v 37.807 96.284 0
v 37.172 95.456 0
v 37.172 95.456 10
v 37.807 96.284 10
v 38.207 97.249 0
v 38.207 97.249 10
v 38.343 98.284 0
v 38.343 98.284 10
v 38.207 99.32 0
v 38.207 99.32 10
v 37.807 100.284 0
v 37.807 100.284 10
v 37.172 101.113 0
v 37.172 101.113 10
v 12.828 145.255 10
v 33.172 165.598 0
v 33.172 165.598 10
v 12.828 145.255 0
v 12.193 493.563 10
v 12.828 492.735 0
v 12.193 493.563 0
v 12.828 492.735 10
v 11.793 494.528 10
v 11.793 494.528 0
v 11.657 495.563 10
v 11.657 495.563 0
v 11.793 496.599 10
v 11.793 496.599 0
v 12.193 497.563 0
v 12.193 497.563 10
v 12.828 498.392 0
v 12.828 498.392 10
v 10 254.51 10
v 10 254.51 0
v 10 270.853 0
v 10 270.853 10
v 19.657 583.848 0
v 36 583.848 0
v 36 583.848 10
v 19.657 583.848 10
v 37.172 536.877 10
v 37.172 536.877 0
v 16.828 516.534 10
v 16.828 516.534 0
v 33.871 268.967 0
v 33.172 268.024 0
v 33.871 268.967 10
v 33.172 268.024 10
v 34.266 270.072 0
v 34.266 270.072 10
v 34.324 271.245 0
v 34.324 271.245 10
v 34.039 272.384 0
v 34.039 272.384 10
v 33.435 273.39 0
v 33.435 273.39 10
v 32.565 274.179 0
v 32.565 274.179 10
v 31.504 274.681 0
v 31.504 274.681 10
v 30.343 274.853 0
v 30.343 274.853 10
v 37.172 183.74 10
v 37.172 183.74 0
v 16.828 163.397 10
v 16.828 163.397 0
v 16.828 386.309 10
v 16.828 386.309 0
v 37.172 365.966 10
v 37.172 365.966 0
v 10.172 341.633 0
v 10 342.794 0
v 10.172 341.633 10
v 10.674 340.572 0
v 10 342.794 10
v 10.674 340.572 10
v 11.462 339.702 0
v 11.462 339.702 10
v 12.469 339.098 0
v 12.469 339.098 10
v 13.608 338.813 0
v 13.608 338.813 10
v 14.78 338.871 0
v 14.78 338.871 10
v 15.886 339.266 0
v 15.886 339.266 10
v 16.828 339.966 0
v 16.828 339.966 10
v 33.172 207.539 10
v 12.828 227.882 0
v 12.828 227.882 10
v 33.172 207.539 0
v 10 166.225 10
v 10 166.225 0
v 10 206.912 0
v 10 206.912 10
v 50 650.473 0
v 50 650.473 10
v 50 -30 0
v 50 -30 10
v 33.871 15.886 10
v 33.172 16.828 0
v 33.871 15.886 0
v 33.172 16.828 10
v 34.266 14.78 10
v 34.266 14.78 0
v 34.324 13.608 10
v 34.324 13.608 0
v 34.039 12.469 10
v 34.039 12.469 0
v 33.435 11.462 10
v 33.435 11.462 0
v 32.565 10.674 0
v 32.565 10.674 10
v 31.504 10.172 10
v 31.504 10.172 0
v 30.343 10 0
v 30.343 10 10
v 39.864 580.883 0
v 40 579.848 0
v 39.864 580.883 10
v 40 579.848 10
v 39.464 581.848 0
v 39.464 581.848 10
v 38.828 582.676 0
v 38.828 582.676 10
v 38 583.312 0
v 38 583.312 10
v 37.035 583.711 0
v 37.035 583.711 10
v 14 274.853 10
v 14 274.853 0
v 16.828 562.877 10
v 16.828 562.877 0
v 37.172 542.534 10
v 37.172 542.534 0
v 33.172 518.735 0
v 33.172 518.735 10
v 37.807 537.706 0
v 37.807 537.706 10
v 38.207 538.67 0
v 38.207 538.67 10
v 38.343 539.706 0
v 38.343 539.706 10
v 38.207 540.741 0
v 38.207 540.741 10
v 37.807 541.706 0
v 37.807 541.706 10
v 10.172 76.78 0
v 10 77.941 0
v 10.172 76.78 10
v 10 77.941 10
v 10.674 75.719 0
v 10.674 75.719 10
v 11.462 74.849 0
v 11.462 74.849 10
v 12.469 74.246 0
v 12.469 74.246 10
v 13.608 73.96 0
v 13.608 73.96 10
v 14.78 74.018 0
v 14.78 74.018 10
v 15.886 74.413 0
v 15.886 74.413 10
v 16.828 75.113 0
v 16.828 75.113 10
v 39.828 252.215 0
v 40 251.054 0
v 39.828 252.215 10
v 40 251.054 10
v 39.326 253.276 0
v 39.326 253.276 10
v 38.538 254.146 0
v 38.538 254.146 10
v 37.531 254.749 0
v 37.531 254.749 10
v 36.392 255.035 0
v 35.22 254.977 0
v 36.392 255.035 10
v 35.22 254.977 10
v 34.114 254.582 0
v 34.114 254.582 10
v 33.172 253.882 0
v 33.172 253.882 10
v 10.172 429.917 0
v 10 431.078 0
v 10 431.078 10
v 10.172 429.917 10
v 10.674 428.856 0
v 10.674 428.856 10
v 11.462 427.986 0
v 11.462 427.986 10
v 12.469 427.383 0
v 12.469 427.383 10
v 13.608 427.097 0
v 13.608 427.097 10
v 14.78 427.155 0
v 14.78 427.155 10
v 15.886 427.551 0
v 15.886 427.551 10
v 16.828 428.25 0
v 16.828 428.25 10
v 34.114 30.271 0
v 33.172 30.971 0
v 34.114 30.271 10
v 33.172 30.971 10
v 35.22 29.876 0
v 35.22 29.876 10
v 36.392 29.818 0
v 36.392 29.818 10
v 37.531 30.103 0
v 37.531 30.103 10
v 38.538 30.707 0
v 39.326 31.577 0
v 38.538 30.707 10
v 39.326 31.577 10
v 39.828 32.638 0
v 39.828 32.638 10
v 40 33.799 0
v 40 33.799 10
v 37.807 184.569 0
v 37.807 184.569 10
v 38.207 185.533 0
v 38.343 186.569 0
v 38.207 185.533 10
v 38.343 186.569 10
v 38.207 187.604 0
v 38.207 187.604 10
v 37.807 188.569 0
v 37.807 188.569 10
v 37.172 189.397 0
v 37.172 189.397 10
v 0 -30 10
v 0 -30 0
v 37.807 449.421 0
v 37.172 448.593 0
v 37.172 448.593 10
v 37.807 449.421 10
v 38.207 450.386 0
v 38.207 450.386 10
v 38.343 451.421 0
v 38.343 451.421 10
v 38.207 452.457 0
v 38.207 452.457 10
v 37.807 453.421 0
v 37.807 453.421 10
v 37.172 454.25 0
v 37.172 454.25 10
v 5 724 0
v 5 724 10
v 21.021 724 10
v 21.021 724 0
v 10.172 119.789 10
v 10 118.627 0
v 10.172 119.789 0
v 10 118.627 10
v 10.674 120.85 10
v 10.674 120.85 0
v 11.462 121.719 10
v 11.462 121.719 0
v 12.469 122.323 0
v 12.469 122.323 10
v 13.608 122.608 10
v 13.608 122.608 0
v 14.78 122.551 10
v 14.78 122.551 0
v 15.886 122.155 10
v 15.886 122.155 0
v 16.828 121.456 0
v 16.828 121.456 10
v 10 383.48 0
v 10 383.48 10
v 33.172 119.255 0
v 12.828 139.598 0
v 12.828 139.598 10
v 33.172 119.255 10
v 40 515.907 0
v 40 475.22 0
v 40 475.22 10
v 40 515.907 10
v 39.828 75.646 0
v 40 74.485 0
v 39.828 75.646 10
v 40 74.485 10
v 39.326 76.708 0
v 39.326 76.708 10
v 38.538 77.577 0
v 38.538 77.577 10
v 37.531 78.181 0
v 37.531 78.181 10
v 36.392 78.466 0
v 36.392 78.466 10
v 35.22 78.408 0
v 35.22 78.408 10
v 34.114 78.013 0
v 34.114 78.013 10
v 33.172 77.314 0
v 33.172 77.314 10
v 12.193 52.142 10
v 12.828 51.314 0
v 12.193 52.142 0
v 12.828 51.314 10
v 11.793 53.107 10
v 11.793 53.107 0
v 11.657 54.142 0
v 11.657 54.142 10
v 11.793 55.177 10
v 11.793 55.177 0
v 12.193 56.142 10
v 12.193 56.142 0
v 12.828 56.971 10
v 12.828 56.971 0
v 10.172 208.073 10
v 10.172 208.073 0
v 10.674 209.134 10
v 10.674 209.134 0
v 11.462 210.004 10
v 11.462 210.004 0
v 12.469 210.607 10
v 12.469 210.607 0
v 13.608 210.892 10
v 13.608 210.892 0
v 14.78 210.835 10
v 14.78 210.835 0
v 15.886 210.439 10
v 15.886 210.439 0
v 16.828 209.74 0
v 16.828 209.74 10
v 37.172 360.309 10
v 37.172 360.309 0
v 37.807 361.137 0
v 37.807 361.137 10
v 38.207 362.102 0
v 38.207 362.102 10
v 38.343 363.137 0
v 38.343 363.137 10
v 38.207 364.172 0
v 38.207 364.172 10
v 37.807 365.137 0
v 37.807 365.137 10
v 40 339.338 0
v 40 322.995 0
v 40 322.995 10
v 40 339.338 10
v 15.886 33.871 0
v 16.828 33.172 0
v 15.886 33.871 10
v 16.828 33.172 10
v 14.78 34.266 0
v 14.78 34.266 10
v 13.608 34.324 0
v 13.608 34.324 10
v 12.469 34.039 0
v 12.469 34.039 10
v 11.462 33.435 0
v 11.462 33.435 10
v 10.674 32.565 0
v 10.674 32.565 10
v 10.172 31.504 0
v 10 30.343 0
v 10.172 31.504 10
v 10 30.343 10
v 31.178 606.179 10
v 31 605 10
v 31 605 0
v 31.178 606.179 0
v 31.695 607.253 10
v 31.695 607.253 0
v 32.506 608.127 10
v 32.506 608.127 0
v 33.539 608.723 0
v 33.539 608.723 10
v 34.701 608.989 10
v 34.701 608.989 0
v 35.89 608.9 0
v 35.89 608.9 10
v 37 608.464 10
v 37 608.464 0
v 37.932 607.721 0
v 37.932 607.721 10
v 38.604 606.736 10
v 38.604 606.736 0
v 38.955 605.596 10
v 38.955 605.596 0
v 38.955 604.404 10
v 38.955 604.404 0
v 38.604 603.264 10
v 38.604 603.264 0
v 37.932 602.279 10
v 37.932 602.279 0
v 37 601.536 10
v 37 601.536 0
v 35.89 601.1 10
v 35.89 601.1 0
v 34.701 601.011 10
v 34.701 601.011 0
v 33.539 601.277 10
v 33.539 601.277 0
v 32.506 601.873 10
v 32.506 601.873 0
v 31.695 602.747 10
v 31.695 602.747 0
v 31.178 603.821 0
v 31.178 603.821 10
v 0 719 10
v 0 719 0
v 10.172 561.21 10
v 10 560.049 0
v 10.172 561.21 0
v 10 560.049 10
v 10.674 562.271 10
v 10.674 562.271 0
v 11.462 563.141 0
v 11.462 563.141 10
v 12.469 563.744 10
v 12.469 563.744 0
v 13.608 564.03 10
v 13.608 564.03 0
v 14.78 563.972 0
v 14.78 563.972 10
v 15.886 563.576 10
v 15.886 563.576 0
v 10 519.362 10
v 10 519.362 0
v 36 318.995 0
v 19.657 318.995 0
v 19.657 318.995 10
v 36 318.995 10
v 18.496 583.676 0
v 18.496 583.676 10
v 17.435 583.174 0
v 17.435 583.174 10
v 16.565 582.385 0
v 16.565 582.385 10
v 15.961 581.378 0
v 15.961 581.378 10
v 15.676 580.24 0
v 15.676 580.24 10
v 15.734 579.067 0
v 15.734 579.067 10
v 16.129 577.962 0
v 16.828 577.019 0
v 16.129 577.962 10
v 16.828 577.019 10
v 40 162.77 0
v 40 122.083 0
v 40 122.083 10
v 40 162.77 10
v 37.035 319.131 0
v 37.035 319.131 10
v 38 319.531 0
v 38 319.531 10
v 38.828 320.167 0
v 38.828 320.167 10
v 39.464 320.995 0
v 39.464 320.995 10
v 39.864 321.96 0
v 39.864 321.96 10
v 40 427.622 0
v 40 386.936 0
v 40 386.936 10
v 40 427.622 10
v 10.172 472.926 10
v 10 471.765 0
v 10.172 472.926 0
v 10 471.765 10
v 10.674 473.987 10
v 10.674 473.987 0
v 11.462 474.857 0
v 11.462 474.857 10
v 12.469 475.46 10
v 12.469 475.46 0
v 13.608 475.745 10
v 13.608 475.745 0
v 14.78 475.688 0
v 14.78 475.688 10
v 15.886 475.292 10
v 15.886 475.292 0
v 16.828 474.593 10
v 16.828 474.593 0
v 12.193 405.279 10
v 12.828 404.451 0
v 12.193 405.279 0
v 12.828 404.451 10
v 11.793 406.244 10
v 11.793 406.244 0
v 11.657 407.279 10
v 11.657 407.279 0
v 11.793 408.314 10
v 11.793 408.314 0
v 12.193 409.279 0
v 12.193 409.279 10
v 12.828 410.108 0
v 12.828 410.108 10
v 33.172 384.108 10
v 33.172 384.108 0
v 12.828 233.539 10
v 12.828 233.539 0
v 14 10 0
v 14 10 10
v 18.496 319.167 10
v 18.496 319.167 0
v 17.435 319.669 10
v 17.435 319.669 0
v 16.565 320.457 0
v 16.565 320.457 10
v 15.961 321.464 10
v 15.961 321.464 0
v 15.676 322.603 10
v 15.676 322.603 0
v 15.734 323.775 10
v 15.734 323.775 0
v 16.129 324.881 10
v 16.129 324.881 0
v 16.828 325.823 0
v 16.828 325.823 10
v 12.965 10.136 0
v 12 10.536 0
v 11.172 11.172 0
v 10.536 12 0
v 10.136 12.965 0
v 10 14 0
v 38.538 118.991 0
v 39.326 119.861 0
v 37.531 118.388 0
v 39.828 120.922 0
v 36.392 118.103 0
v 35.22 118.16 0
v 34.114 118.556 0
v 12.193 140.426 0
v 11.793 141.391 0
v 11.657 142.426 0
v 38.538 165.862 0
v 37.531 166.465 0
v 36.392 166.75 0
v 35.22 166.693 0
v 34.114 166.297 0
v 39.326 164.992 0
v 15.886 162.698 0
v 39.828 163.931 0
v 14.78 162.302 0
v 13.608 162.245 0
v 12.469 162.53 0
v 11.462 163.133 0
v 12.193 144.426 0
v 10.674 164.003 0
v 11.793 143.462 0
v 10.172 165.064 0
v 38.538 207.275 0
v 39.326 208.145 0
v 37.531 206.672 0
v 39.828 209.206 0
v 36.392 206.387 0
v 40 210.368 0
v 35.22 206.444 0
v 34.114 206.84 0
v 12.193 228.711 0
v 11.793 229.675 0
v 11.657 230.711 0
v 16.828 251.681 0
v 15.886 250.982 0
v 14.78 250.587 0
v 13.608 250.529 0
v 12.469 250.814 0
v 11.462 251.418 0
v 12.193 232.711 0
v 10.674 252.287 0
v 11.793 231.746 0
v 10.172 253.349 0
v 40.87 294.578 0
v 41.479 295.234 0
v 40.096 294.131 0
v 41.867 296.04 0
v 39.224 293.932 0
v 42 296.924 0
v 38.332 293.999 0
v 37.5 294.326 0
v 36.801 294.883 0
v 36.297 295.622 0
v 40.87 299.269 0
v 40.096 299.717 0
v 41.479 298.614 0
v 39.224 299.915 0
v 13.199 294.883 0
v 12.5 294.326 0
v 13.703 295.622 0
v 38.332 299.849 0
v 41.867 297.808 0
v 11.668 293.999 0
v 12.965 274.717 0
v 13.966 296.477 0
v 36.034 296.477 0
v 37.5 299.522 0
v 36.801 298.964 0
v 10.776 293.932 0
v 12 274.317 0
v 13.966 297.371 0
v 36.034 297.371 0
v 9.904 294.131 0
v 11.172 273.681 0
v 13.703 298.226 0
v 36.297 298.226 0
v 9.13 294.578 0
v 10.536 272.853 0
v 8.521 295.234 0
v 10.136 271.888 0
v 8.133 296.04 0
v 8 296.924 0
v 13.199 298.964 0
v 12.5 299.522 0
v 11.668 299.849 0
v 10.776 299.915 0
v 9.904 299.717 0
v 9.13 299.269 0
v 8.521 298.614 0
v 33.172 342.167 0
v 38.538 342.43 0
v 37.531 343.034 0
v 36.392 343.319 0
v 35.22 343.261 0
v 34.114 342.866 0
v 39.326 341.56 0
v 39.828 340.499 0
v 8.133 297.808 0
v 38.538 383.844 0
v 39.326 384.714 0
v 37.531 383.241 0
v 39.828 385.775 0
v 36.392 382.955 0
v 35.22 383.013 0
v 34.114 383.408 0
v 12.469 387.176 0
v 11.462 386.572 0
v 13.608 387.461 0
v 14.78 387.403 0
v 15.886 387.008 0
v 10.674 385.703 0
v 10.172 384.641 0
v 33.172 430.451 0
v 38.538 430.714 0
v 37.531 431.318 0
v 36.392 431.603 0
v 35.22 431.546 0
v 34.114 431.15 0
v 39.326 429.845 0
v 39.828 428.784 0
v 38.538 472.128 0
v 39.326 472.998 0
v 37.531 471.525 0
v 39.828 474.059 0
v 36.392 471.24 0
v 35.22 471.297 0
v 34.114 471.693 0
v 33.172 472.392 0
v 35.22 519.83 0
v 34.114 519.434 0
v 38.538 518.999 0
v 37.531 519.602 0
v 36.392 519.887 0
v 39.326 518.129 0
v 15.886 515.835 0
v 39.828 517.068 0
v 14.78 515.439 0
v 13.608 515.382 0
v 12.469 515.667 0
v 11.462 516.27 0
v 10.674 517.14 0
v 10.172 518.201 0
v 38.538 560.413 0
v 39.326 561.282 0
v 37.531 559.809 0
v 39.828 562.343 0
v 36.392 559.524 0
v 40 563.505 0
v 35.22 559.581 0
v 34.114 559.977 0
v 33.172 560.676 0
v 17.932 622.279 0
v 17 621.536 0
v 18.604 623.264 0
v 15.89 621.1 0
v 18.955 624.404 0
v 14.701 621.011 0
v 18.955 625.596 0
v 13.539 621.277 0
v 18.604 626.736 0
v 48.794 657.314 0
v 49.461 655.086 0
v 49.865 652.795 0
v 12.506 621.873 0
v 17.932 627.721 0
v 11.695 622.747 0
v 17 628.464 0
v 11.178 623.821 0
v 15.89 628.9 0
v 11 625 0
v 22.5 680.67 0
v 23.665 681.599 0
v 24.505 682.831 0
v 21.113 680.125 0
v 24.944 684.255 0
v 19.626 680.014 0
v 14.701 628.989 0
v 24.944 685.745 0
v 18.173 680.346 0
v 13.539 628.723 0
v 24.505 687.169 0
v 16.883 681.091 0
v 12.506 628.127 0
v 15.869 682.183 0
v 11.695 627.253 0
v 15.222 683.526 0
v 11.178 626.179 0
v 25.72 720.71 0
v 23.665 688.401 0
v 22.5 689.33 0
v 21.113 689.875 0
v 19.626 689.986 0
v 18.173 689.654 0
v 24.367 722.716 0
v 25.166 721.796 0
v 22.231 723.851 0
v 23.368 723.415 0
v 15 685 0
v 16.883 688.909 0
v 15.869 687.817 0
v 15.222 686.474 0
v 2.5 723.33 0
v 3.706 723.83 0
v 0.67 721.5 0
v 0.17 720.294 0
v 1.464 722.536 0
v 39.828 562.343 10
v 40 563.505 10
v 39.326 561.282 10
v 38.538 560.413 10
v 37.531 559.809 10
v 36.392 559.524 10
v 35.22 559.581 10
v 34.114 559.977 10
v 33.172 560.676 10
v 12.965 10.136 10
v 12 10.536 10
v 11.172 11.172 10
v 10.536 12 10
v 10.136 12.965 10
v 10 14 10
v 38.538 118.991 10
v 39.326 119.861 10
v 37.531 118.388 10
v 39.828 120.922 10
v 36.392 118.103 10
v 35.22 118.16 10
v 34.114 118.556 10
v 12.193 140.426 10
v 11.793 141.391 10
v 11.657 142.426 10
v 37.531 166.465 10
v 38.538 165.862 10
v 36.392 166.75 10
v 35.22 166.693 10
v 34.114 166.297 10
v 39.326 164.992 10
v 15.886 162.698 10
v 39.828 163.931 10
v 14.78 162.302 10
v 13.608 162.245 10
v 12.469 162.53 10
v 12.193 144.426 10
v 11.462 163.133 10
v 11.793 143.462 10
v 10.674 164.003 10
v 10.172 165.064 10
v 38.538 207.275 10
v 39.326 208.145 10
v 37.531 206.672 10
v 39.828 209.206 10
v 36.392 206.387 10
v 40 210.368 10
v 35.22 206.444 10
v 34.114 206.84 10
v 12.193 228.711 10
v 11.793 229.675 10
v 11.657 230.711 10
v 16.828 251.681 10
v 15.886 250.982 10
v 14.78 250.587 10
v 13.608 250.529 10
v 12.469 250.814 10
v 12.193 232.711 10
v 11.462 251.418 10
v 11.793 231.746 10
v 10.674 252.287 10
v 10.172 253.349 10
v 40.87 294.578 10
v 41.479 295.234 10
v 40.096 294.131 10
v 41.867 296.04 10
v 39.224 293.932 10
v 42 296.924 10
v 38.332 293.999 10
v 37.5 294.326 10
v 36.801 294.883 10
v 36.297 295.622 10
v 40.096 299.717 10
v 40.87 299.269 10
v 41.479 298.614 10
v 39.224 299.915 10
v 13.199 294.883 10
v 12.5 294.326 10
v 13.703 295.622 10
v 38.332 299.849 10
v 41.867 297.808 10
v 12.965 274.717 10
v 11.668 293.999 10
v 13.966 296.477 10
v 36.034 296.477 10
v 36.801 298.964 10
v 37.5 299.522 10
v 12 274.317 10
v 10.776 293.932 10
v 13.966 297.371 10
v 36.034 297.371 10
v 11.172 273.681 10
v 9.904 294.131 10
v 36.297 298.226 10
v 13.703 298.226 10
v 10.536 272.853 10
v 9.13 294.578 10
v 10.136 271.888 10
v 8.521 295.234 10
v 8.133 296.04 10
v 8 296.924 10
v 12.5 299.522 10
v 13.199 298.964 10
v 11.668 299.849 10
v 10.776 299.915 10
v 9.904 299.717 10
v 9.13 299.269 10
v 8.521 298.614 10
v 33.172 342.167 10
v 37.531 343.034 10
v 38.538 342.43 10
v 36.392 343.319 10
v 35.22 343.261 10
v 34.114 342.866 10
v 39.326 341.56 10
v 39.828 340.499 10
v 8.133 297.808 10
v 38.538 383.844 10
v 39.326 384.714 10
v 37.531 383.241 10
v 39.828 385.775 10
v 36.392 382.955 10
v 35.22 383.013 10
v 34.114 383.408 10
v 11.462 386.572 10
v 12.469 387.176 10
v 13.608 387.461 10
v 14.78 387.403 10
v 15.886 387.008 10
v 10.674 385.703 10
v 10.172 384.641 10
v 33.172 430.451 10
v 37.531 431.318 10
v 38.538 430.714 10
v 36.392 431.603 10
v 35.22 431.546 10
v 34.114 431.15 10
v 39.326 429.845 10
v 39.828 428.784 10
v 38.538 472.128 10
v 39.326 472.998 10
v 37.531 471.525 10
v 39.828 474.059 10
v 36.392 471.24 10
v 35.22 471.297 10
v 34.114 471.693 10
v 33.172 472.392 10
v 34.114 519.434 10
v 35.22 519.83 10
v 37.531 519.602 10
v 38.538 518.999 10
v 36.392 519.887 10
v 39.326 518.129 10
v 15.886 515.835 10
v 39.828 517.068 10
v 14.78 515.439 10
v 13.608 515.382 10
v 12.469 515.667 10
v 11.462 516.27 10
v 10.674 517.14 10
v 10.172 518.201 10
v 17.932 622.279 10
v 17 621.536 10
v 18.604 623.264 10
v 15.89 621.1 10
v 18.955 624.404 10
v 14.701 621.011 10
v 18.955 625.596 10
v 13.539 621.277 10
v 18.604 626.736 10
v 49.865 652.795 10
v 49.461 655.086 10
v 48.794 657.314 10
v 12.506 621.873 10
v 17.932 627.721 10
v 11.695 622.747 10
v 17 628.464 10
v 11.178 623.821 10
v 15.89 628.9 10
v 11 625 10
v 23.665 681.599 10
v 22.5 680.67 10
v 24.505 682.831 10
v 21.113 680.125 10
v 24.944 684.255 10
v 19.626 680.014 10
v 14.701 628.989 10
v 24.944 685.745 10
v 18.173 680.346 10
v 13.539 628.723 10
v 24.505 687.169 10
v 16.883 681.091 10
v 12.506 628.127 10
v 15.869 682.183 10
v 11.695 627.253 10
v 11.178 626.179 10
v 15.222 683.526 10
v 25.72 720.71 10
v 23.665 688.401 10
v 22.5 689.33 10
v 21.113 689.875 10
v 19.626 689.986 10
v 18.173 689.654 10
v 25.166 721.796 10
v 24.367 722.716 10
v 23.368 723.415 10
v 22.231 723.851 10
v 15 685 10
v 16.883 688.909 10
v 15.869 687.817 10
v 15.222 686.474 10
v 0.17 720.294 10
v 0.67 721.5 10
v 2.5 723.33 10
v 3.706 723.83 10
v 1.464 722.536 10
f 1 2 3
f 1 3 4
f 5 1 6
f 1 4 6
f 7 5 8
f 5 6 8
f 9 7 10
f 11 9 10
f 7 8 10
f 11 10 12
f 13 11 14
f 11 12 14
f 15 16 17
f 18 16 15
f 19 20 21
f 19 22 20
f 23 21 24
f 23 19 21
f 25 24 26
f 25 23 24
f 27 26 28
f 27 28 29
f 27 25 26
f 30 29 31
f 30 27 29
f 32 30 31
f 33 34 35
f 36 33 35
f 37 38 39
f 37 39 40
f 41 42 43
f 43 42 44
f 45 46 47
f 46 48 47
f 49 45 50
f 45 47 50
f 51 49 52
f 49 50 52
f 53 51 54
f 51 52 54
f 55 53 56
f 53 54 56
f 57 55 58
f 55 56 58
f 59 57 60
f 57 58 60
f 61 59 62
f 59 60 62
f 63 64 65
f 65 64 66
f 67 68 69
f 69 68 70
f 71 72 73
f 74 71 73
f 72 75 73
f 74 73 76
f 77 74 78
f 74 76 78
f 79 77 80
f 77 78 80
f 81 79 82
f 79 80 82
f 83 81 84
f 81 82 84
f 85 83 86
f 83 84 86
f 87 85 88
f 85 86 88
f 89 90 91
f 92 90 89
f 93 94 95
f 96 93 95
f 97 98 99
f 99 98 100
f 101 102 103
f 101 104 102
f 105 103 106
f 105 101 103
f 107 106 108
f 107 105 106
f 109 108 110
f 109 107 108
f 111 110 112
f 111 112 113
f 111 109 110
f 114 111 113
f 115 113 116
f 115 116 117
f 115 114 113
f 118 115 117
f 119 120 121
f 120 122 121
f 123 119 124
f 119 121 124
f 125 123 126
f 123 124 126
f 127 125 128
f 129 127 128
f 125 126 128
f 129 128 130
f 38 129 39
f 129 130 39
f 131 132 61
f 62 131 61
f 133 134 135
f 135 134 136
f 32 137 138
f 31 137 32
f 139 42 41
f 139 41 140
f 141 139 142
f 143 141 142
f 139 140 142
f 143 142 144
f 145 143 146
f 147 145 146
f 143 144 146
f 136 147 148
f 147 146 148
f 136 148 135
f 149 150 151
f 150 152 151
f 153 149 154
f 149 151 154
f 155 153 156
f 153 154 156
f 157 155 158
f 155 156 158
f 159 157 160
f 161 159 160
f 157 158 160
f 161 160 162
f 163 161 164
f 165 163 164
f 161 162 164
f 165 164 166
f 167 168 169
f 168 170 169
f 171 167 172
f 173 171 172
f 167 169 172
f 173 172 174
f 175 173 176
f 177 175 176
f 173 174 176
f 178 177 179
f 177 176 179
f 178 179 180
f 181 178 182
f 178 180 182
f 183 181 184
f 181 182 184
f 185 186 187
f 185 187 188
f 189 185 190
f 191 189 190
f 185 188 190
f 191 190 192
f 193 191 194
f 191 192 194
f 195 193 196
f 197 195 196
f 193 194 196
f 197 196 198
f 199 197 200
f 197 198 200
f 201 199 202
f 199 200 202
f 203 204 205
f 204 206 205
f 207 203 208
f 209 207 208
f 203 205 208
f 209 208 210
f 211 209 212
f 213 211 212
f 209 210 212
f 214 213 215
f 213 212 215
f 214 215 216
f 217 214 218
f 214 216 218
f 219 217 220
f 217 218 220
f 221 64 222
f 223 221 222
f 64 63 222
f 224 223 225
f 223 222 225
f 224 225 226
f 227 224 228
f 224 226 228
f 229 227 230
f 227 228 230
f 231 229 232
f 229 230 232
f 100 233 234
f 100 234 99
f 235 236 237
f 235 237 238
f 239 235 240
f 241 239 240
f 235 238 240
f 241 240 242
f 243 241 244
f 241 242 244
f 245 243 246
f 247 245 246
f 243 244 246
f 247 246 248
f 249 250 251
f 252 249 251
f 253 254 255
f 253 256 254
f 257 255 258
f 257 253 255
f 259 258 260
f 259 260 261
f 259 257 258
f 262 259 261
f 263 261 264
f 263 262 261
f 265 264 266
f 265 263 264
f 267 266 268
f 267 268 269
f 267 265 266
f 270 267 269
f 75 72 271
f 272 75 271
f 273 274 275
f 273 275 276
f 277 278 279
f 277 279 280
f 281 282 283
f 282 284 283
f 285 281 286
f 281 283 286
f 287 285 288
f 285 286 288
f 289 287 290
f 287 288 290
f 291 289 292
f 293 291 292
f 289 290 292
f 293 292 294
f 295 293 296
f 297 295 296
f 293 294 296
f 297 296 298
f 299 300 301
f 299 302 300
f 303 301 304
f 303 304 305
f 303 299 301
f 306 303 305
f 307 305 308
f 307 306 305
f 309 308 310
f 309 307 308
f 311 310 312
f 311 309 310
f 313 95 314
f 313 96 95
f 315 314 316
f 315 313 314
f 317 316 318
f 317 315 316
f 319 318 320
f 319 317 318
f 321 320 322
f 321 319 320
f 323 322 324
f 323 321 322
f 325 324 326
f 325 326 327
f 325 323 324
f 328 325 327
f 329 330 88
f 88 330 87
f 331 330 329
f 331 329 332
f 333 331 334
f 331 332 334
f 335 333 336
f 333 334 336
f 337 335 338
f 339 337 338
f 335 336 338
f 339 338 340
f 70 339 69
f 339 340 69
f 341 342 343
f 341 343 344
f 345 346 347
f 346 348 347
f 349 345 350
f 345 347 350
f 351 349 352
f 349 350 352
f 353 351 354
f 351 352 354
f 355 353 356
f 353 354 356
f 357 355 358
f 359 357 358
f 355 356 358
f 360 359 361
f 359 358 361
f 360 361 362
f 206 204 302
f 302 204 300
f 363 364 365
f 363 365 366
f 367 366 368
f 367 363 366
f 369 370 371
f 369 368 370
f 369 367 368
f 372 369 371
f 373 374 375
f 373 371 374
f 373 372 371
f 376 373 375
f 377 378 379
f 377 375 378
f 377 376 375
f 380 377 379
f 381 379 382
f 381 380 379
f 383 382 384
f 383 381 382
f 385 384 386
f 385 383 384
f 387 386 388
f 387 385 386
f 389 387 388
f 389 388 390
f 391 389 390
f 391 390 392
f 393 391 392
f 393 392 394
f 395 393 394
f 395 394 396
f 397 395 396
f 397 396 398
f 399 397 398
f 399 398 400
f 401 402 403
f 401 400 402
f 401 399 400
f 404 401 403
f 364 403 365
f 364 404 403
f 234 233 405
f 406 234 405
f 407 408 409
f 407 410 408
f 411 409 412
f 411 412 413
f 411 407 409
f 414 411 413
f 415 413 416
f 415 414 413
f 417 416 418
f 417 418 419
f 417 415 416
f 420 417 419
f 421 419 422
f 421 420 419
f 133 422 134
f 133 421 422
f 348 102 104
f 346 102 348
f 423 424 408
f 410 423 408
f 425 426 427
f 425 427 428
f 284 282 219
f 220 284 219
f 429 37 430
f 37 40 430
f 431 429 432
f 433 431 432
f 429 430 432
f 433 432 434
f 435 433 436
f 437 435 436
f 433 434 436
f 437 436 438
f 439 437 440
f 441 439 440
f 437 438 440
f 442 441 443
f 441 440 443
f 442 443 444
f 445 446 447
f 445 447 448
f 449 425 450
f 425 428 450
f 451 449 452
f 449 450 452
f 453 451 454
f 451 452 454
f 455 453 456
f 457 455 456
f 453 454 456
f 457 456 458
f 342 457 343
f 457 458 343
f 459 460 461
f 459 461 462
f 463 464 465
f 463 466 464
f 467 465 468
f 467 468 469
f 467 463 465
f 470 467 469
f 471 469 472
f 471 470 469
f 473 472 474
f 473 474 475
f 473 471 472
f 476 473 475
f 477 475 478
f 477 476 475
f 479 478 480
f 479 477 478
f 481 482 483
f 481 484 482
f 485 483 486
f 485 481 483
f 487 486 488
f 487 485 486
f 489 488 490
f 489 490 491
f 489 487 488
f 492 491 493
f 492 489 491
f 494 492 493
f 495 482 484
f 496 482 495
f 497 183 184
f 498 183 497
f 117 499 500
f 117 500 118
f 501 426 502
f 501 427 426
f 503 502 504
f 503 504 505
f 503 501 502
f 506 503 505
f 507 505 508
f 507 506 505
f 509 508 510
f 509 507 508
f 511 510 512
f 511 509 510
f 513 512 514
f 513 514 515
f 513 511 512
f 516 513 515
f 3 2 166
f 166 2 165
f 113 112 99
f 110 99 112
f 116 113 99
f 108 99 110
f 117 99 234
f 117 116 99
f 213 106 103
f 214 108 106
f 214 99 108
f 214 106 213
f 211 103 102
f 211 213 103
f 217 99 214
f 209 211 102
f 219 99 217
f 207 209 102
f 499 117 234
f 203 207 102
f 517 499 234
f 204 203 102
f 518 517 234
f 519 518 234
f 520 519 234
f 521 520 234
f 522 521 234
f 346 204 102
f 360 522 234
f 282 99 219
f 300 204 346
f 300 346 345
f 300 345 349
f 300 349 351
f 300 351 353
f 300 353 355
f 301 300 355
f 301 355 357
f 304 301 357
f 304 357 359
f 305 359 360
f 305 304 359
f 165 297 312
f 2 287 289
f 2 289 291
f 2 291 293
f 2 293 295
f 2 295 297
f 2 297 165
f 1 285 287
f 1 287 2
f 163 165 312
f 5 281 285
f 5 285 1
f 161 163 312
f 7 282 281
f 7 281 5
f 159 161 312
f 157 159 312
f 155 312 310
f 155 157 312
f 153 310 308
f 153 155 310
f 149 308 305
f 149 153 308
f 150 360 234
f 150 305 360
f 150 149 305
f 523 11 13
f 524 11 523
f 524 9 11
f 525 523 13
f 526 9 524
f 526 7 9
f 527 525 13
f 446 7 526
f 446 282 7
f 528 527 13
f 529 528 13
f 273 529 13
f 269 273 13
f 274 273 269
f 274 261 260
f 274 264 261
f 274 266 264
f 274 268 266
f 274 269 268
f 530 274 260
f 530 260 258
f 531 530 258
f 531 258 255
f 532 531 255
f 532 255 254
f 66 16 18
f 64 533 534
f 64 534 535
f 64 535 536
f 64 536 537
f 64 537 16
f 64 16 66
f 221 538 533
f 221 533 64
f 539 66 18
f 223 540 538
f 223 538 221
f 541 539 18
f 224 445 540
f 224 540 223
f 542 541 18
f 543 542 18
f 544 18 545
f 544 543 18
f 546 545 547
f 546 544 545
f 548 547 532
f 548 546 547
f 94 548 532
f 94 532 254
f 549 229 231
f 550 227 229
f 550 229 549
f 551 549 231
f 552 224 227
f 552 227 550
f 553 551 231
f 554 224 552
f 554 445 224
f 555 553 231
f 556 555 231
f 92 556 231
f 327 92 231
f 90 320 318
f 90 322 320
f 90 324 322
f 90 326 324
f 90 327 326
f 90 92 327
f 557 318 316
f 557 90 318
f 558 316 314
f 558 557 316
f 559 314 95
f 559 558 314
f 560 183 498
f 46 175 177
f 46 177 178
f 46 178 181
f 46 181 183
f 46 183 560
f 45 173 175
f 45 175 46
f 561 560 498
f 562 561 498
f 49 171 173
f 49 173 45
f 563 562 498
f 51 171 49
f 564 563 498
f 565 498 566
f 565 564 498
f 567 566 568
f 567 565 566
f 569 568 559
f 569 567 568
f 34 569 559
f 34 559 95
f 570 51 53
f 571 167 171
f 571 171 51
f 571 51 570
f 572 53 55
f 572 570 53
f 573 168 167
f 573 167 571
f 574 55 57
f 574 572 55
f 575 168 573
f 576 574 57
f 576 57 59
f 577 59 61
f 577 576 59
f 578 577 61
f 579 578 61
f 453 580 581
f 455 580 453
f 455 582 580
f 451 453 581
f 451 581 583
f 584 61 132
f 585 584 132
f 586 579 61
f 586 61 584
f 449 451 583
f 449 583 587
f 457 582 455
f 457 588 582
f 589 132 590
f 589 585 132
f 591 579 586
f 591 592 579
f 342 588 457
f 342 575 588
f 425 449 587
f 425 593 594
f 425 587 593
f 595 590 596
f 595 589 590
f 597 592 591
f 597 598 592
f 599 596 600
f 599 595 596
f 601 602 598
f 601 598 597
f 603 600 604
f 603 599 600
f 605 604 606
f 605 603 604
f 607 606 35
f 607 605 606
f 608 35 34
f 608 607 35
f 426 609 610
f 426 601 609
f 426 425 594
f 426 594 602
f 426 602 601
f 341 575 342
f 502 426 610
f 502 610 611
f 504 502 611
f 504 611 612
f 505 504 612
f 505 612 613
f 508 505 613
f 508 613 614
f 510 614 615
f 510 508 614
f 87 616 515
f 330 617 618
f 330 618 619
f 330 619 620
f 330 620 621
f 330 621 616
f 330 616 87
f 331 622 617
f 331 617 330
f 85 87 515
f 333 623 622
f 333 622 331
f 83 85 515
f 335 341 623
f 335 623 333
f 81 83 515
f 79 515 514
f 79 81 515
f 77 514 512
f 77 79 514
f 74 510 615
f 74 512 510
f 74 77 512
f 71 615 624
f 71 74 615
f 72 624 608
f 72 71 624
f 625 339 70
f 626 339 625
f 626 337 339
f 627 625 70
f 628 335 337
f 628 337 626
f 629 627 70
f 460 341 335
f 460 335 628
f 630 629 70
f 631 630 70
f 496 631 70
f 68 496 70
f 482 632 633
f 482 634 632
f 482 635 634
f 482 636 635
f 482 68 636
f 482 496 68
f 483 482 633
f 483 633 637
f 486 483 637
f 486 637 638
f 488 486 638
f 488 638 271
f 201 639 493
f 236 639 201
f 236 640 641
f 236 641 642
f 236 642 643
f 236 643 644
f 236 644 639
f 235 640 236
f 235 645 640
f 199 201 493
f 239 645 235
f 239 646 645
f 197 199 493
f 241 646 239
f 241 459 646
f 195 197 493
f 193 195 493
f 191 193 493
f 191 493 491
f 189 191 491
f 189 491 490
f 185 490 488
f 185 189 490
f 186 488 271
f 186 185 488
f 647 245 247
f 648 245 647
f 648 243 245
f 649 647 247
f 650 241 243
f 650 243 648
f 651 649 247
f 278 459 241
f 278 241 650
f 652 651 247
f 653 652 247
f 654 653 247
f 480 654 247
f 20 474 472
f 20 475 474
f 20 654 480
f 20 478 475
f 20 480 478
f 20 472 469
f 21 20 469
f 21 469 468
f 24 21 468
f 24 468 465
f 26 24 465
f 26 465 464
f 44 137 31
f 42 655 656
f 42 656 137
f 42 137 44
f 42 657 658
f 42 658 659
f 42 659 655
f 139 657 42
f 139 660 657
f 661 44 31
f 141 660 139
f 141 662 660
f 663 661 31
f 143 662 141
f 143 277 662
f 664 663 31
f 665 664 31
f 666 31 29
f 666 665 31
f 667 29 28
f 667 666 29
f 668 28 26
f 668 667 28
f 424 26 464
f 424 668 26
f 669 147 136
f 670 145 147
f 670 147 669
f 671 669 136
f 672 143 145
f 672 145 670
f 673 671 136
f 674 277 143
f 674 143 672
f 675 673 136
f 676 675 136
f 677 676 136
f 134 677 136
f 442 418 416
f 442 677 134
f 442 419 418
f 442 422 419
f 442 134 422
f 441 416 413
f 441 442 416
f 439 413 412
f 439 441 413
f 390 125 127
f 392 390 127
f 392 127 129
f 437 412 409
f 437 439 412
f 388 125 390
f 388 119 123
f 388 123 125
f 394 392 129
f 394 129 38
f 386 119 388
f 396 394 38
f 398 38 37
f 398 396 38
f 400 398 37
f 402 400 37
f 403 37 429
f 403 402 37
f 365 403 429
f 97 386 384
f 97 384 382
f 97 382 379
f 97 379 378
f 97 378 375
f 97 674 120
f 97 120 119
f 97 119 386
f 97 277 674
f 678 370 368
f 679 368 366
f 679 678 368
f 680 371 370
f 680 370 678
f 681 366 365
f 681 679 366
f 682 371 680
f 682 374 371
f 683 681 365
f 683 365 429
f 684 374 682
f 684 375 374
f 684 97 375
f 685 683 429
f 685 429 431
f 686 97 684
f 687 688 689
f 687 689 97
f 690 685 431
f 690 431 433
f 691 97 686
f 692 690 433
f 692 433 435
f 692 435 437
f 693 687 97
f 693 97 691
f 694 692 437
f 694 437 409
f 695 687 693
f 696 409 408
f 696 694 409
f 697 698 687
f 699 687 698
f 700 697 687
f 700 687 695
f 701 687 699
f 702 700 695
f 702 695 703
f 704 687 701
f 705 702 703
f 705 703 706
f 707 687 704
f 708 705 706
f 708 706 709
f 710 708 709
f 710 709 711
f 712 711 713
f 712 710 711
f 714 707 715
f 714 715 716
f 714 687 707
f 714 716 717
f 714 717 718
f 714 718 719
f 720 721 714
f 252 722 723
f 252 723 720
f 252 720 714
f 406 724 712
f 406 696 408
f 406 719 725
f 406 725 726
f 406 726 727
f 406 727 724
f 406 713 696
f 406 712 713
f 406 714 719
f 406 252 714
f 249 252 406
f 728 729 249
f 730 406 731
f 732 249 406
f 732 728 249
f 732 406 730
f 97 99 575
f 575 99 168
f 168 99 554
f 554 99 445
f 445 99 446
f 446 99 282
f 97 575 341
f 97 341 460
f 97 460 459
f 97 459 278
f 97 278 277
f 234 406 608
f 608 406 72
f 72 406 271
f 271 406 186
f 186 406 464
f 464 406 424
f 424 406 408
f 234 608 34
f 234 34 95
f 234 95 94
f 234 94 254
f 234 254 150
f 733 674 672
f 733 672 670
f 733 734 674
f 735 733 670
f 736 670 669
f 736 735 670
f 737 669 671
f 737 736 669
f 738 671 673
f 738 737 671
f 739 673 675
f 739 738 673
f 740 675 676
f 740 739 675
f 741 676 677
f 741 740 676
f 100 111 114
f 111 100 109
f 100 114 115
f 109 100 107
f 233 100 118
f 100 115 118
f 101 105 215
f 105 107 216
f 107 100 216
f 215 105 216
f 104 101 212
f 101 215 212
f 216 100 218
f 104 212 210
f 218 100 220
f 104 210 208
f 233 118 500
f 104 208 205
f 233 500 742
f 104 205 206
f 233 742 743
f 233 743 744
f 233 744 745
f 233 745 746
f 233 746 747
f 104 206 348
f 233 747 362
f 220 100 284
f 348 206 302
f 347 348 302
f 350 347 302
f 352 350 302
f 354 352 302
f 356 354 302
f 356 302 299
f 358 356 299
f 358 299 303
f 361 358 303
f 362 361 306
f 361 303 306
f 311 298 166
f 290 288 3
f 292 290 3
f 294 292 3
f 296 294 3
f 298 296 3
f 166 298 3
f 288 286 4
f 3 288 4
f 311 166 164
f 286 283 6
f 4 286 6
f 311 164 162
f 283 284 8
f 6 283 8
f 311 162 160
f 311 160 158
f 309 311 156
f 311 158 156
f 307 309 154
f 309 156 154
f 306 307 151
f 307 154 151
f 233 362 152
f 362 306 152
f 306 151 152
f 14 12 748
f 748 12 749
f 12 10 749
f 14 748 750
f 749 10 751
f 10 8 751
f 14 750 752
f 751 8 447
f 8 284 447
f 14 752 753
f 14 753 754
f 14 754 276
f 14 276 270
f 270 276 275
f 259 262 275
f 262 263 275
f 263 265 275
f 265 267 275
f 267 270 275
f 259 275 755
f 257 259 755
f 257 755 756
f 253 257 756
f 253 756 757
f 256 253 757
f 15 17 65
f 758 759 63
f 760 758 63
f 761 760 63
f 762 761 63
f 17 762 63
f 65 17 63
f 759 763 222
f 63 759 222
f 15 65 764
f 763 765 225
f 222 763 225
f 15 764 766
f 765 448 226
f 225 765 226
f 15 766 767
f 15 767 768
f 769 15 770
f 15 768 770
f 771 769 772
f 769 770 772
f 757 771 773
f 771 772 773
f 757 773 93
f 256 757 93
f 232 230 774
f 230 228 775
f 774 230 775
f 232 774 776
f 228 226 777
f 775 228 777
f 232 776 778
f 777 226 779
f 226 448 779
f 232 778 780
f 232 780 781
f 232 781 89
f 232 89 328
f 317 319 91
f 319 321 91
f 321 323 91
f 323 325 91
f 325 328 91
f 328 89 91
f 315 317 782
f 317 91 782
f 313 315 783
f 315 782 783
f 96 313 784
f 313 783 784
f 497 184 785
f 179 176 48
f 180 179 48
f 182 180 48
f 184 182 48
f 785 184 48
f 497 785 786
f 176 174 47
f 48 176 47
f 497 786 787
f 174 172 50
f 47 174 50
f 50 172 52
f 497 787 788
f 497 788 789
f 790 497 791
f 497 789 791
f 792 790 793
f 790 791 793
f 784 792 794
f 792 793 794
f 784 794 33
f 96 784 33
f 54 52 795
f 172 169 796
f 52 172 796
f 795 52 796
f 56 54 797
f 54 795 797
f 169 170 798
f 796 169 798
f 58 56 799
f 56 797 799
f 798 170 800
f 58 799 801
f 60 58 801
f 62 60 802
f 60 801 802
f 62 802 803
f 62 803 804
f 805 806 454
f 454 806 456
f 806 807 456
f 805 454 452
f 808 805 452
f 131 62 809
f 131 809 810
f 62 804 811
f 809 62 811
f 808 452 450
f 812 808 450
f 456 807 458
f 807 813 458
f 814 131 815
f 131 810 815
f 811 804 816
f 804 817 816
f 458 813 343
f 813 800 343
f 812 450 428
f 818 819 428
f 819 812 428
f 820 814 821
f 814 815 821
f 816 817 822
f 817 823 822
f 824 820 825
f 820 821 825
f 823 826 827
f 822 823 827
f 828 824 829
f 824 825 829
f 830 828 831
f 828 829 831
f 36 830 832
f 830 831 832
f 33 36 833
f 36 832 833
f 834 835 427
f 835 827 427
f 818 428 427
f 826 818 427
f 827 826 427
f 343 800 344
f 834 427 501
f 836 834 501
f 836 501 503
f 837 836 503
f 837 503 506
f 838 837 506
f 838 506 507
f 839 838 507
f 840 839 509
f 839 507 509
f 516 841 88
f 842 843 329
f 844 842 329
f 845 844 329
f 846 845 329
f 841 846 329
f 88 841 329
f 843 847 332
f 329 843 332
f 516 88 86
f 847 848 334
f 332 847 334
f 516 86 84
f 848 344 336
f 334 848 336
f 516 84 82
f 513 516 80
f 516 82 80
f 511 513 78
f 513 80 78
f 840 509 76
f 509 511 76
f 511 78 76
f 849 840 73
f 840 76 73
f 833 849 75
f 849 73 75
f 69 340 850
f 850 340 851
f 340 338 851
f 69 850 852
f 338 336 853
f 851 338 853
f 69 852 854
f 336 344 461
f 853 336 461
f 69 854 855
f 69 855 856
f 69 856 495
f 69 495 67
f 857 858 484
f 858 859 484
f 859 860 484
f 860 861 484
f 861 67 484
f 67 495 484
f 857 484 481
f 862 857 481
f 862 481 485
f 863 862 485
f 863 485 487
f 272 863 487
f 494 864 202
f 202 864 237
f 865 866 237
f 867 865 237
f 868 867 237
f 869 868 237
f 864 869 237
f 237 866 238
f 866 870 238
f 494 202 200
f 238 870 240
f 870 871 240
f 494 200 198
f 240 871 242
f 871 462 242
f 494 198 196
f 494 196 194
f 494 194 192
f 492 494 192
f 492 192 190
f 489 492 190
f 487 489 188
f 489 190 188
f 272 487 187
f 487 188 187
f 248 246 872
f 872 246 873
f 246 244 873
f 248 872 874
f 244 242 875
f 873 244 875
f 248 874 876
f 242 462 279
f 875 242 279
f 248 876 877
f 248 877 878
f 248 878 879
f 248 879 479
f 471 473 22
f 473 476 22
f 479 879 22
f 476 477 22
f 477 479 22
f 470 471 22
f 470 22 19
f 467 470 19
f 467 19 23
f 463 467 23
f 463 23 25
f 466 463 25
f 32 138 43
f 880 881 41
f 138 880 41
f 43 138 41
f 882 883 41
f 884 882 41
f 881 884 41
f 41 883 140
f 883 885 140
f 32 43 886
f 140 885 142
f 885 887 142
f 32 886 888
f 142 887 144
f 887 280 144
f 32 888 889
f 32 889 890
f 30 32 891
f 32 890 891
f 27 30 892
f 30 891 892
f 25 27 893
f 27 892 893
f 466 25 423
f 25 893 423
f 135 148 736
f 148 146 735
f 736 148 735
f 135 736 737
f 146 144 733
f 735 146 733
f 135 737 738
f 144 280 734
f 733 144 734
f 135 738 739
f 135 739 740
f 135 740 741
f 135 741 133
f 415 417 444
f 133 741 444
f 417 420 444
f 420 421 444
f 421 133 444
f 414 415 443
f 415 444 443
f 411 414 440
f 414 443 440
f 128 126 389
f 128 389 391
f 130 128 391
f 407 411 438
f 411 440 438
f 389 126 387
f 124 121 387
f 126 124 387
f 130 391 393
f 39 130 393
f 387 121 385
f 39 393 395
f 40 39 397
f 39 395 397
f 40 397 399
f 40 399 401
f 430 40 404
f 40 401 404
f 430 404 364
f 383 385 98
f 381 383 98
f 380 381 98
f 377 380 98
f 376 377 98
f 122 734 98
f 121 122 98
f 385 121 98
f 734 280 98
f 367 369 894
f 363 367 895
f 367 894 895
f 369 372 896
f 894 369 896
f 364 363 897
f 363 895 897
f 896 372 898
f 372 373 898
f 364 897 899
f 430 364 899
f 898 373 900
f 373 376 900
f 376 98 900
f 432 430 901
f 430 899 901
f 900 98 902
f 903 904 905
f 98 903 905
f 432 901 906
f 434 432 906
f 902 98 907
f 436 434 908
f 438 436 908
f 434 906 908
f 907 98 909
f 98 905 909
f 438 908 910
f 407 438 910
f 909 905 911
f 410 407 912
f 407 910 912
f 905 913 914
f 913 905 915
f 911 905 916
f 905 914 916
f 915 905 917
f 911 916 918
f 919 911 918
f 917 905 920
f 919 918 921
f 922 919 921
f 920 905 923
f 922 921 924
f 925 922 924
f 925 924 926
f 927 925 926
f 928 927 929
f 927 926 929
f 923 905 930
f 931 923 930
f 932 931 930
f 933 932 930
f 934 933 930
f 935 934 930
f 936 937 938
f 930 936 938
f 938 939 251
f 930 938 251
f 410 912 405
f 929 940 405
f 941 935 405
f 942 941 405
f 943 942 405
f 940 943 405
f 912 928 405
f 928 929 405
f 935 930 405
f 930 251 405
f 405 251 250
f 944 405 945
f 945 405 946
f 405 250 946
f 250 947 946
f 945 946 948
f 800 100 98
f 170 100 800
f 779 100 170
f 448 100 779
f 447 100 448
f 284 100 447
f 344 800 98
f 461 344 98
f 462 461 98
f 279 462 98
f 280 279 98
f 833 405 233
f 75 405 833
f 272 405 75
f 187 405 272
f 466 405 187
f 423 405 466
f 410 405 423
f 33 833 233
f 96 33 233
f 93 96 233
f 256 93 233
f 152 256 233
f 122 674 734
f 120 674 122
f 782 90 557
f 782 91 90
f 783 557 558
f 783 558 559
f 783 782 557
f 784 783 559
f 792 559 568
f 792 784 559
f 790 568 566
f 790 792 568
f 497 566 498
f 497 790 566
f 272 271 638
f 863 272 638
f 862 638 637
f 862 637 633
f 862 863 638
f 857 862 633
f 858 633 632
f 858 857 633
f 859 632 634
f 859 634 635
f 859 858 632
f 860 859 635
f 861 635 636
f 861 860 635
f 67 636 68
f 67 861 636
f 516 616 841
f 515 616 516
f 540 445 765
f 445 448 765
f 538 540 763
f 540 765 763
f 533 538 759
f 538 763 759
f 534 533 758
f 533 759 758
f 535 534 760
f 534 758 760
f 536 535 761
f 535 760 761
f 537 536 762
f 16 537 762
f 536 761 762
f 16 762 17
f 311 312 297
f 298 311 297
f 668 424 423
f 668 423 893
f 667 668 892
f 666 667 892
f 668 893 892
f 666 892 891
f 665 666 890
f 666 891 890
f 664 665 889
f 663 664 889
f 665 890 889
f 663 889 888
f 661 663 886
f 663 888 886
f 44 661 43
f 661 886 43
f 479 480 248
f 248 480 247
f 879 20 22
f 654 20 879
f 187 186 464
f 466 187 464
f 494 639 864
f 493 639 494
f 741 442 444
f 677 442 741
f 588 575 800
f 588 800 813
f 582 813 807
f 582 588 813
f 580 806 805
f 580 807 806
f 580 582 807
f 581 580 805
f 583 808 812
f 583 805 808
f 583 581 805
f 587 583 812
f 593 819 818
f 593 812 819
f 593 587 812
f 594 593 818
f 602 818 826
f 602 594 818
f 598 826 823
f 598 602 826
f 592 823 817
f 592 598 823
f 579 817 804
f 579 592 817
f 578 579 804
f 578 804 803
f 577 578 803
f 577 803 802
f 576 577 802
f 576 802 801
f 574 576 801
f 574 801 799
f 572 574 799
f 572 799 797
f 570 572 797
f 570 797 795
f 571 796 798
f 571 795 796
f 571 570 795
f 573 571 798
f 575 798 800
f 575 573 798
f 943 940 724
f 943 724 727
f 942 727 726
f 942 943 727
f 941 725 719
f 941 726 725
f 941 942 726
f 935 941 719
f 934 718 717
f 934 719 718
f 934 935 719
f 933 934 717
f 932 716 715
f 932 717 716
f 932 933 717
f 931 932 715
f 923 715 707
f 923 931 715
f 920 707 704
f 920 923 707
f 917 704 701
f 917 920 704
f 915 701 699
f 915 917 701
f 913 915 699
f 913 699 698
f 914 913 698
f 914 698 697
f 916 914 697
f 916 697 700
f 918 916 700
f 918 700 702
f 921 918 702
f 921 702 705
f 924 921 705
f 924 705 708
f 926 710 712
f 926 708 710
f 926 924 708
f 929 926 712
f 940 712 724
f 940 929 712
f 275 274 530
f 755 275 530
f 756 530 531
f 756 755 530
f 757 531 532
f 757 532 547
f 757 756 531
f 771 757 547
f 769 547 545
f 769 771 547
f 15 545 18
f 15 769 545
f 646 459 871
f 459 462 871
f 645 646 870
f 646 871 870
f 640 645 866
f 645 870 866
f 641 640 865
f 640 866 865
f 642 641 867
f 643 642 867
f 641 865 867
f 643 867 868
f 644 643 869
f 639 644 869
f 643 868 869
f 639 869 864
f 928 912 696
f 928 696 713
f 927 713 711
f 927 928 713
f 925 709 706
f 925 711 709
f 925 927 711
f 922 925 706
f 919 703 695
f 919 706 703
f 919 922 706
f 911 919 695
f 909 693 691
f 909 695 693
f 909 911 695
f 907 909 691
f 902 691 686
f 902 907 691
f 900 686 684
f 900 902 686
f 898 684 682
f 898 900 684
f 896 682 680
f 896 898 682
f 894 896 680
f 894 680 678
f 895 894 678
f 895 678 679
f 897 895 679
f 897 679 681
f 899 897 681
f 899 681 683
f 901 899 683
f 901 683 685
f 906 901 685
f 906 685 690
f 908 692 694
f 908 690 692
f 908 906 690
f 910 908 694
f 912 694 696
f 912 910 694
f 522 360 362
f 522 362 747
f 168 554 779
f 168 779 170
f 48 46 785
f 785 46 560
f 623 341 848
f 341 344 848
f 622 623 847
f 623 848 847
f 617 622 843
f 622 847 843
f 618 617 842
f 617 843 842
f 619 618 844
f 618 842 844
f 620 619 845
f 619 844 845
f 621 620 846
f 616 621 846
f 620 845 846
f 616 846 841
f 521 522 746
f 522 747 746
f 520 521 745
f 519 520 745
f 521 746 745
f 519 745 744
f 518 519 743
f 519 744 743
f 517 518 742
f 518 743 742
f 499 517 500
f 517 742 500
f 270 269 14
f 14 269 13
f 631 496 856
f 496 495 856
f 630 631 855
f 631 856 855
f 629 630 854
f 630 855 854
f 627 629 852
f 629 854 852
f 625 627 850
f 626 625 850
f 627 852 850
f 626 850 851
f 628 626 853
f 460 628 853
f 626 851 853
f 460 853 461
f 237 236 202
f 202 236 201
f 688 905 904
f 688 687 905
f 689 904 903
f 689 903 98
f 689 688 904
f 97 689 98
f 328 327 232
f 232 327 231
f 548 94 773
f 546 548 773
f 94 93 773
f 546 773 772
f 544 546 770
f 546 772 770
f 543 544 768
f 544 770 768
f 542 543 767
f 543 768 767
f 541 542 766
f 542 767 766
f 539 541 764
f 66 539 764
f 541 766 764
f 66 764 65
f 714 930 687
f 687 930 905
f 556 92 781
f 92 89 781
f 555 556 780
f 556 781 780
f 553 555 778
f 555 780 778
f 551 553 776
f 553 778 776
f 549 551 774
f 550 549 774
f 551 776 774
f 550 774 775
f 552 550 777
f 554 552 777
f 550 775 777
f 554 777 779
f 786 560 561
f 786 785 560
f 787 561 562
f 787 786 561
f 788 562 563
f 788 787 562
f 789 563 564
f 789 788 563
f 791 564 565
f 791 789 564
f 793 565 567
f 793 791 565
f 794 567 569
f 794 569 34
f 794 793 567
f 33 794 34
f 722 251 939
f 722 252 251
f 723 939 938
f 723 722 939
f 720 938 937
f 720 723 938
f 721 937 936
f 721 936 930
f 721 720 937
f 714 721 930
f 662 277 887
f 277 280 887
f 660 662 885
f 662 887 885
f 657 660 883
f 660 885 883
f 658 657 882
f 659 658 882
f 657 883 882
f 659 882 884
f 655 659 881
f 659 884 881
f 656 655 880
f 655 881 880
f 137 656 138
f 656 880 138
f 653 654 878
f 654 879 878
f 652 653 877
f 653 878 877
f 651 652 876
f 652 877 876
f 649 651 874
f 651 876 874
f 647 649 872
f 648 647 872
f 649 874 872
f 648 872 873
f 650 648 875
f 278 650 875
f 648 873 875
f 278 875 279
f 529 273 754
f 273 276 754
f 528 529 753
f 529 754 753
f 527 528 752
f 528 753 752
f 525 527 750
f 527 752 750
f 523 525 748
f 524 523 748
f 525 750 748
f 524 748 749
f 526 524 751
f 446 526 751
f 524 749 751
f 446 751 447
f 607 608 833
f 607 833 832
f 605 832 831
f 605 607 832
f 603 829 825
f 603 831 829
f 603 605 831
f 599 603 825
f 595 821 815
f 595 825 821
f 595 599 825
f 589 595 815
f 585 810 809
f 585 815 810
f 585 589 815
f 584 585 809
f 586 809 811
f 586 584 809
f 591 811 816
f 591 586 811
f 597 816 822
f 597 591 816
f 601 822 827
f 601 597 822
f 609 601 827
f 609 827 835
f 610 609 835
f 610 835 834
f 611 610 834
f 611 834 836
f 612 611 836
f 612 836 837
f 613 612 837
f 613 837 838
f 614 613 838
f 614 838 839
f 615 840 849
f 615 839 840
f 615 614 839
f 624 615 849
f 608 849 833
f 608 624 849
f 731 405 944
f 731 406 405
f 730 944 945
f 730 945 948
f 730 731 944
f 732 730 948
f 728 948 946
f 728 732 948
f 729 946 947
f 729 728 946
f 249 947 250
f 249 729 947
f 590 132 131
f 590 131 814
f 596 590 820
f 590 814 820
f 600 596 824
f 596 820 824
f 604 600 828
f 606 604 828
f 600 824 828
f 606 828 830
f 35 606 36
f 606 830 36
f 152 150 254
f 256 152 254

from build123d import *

# Parameters (mm, degrees)
ESQUISSE1_W                  = 50
ESQUISSE1_H                  = 594
BOSS_EXTRU_1_DEPTH           = 10
ENL_V_MAT_EXTRU_1_DEPTH      = 597.18453519
ENL_V_MAT_EXTRU_1_DEPTH_BACK = 597.18453519
CONG_1_R                     = 4
ESQUISSE3_W                  = 50
ESQUISSE3_H                  = 30
BOSS_EXTRU_2_DEPTH           = 10
ENL_V_MAT_EXTRU_2_DEPTH      = 597.18453519
ENL_V_MAT_EXTRU_2_DEPTH_BACK = 597.18453519
ESQUISSE4_R                  = 3
BOSS_EXTRU_3_DEPTH           = 10
ENL_V_MAT_EXTRU_3_DEPTH      = 726.793359022
ENL_V_MAT_EXTRU_3_DEPTH_BACK = 726.793359022
ESQUISSE6_R                  = 4
ESQUISSE6_R_2                = 5
CONG_2_R                     = 5
CONG_3_R                     = 20


with BuildPart() as part:
    # Esquisse1 → Boss.-Extru.1 (new body)
    with BuildSketch(Plane.XY):
        with Locations((25, 297)):
            Rectangle(ESQUISSE1_W, ESQUISSE1_H)
    extrude(amount=BOSS_EXTRU_1_DEPTH)

    # Esquisse2 → Enlèv. mat.-Extru.1 (cut, two sides: drawn at the far end of the back side and taken through both)
    with BuildSketch(Plane.XY.offset(10).offset(-ENL_V_MAT_EXTRU_1_DEPTH_BACK)):
        Polygon((10, 10), (40, 10), (10, 40), align=None)
        Polygon((40, 24.142135624), (10, 54.142135624), (40, 84.142135624), align=None)
        Polygon((10, 68.284271247), (10, 128.284271247), (40, 98.284271247), align=None)
        Polygon((40, 172.426406871), (10, 142.426406871), (40, 112.426406871), align=None)
        Polygon((10, 156.568542495), (10, 216.568542495), (40, 186.568542495), align=None)
        Polygon((40, 260.710678119), (10, 230.710678119), (40, 200.710678119), align=None)
        Polygon((40, 274.852813742), (10, 244.852813742), (10, 274.852813742), align=None)
        Polygon((40, 348.994949366), (10, 318.994949366), (40, 318.994949366), align=None)
        Polygon((10, 333.13708499), (10, 393.13708499), (40, 363.13708499), align=None)
        Polygon((40, 437.279220614), (10, 407.279220614), (40, 377.279220614), align=None)
        Polygon((10, 421.421356237), (10, 481.421356237), (40, 451.421356237), align=None)
        Polygon((40, 525.563491861), (10, 495.563491861), (40, 465.563491861), align=None)
        Polygon((10, 509.705627485), (10, 569.705627485), (40, 539.705627485), align=None)
        Polygon((10, 583.847763109), (40, 553.847763109), (40, 583.847763109), align=None)
    extrude(amount=ENL_V_MAT_EXTRU_1_DEPTH + ENL_V_MAT_EXTRU_1_DEPTH_BACK, mode=Mode.SUBTRACT)

    # Congé1
    cong_1_edges = [part.edges().sort_by_distance(p)[0] for p in [
        (40, 112.426406871, 5),
        (10, 142.426406871, 5),
        (40, 172.426406871, 5),
        (40, 539.705627485, 5),
        (10, 509.705627485, 5),
        (10, 569.705627485, 5),
        (40, 377.279220614, 5),
        (10, 407.279220614, 5),
        (40, 437.279220614, 5),
        (40, 363.13708499, 5),
        (10, 333.13708499, 5),
        (10, 393.13708499, 5),
        (40, 465.563491861, 5),
        (10, 495.563491861, 5),
        (40, 525.563491861, 5),
        (40, 451.421356237, 5),
        (10, 421.421356237, 5),
        (10, 481.421356237, 5),
        (10, 10, 5),
        (10, 40, 5),
        (40, 10, 5),
        (40, 200.710678119, 5),
        (10, 230.710678119, 5),
        (40, 260.710678119, 5),
        (40, 186.568542495, 5),
        (10, 156.568542495, 5),
        (10, 216.568542495, 5),
        (10, 244.852813742, 5),
        (10, 274.852813742, 5),
        (40, 274.852813742, 5),
        (40, 318.994949366, 5),
        (10, 318.994949366, 5),
        (40, 348.994949366, 5),
        (40, 98.284271247, 5),
        (10, 68.284271247, 5),
        (10, 128.284271247, 5),
        (40, 84.142135624, 5),
        (40, 24.142135624, 5),
        (10, 54.142135624, 5),
        (10, 583.847763109, 5),
        (40, 583.847763109, 5),
        (40, 553.847763109, 5),
    ]]
    fillet(cong_1_edges, radius=CONG_1_R)

    # Esquisse3 → Boss.-Extru.2 (add)
    with BuildSketch(Plane.XY.offset(10)):
        with Locations((25, -15)):
            Rectangle(ESQUISSE3_W, ESQUISSE3_H)
    extrude(amount=-BOSS_EXTRU_2_DEPTH)

    # Esquisse4 → Enlèv. mat.-Extru.2 (cut, two sides: drawn at the far end of the back side and taken through both)
    with BuildSketch(Plane.XY.offset(10).offset(-ENL_V_MAT_EXTRU_2_DEPTH_BACK)):
        with Locations((39, 296.923881554)):
            Circle(ESQUISSE4_R)
        with Locations(Location((11, 296.923881554, 0), (0, 0, 180))):
            Circle(ESQUISSE4_R)
    extrude(amount=ENL_V_MAT_EXTRU_2_DEPTH + ENL_V_MAT_EXTRU_2_DEPTH_BACK, mode=Mode.SUBTRACT)

    # Esquisse5 → Boss.-Extru.3 (add)
    with BuildSketch(Plane.XY.offset(10)):
        Polygon((50, 594), (0, 594), (0, 724), (24.522083601, 724), (50, 654), align=None)
    extrude(amount=-BOSS_EXTRU_3_DEPTH)

    # Esquisse6 → Enlèv. mat.-Extru.3 (cut, two sides: drawn at the far end of the back side and taken through both)
    with BuildSketch(Plane(origin=(0, 0, 0), x_dir=(-1, 0, 0), z_dir=(0, 0, -1)).offset(-ENL_V_MAT_EXTRU_3_DEPTH_BACK)):
        with Locations((-15, 625)):
            Circle(ESQUISSE6_R)
        with Locations((-35, 605)):
            Circle(ESQUISSE6_R)
        with Locations((-20, 685)):
            Circle(ESQUISSE6_R_2)
    extrude(amount=ENL_V_MAT_EXTRU_3_DEPTH + ENL_V_MAT_EXTRU_3_DEPTH_BACK, mode=Mode.SUBTRACT)

    # Congé2
    cong_2_edges = [part.edges().sort_by_distance(p)[0] for p in [
        (0, 724, 5),
        (24.522083601, 724, 5),
    ]]
    fillet(cong_2_edges, radius=CONG_2_R)

    # Congé3
    cong_3_edges = [part.edges().sort_by_distance(p)[0] for p in [
        (50, 654, 5),
    ]]
    fillet(cong_3_edges, radius=CONG_3_R)


solid = part.part
